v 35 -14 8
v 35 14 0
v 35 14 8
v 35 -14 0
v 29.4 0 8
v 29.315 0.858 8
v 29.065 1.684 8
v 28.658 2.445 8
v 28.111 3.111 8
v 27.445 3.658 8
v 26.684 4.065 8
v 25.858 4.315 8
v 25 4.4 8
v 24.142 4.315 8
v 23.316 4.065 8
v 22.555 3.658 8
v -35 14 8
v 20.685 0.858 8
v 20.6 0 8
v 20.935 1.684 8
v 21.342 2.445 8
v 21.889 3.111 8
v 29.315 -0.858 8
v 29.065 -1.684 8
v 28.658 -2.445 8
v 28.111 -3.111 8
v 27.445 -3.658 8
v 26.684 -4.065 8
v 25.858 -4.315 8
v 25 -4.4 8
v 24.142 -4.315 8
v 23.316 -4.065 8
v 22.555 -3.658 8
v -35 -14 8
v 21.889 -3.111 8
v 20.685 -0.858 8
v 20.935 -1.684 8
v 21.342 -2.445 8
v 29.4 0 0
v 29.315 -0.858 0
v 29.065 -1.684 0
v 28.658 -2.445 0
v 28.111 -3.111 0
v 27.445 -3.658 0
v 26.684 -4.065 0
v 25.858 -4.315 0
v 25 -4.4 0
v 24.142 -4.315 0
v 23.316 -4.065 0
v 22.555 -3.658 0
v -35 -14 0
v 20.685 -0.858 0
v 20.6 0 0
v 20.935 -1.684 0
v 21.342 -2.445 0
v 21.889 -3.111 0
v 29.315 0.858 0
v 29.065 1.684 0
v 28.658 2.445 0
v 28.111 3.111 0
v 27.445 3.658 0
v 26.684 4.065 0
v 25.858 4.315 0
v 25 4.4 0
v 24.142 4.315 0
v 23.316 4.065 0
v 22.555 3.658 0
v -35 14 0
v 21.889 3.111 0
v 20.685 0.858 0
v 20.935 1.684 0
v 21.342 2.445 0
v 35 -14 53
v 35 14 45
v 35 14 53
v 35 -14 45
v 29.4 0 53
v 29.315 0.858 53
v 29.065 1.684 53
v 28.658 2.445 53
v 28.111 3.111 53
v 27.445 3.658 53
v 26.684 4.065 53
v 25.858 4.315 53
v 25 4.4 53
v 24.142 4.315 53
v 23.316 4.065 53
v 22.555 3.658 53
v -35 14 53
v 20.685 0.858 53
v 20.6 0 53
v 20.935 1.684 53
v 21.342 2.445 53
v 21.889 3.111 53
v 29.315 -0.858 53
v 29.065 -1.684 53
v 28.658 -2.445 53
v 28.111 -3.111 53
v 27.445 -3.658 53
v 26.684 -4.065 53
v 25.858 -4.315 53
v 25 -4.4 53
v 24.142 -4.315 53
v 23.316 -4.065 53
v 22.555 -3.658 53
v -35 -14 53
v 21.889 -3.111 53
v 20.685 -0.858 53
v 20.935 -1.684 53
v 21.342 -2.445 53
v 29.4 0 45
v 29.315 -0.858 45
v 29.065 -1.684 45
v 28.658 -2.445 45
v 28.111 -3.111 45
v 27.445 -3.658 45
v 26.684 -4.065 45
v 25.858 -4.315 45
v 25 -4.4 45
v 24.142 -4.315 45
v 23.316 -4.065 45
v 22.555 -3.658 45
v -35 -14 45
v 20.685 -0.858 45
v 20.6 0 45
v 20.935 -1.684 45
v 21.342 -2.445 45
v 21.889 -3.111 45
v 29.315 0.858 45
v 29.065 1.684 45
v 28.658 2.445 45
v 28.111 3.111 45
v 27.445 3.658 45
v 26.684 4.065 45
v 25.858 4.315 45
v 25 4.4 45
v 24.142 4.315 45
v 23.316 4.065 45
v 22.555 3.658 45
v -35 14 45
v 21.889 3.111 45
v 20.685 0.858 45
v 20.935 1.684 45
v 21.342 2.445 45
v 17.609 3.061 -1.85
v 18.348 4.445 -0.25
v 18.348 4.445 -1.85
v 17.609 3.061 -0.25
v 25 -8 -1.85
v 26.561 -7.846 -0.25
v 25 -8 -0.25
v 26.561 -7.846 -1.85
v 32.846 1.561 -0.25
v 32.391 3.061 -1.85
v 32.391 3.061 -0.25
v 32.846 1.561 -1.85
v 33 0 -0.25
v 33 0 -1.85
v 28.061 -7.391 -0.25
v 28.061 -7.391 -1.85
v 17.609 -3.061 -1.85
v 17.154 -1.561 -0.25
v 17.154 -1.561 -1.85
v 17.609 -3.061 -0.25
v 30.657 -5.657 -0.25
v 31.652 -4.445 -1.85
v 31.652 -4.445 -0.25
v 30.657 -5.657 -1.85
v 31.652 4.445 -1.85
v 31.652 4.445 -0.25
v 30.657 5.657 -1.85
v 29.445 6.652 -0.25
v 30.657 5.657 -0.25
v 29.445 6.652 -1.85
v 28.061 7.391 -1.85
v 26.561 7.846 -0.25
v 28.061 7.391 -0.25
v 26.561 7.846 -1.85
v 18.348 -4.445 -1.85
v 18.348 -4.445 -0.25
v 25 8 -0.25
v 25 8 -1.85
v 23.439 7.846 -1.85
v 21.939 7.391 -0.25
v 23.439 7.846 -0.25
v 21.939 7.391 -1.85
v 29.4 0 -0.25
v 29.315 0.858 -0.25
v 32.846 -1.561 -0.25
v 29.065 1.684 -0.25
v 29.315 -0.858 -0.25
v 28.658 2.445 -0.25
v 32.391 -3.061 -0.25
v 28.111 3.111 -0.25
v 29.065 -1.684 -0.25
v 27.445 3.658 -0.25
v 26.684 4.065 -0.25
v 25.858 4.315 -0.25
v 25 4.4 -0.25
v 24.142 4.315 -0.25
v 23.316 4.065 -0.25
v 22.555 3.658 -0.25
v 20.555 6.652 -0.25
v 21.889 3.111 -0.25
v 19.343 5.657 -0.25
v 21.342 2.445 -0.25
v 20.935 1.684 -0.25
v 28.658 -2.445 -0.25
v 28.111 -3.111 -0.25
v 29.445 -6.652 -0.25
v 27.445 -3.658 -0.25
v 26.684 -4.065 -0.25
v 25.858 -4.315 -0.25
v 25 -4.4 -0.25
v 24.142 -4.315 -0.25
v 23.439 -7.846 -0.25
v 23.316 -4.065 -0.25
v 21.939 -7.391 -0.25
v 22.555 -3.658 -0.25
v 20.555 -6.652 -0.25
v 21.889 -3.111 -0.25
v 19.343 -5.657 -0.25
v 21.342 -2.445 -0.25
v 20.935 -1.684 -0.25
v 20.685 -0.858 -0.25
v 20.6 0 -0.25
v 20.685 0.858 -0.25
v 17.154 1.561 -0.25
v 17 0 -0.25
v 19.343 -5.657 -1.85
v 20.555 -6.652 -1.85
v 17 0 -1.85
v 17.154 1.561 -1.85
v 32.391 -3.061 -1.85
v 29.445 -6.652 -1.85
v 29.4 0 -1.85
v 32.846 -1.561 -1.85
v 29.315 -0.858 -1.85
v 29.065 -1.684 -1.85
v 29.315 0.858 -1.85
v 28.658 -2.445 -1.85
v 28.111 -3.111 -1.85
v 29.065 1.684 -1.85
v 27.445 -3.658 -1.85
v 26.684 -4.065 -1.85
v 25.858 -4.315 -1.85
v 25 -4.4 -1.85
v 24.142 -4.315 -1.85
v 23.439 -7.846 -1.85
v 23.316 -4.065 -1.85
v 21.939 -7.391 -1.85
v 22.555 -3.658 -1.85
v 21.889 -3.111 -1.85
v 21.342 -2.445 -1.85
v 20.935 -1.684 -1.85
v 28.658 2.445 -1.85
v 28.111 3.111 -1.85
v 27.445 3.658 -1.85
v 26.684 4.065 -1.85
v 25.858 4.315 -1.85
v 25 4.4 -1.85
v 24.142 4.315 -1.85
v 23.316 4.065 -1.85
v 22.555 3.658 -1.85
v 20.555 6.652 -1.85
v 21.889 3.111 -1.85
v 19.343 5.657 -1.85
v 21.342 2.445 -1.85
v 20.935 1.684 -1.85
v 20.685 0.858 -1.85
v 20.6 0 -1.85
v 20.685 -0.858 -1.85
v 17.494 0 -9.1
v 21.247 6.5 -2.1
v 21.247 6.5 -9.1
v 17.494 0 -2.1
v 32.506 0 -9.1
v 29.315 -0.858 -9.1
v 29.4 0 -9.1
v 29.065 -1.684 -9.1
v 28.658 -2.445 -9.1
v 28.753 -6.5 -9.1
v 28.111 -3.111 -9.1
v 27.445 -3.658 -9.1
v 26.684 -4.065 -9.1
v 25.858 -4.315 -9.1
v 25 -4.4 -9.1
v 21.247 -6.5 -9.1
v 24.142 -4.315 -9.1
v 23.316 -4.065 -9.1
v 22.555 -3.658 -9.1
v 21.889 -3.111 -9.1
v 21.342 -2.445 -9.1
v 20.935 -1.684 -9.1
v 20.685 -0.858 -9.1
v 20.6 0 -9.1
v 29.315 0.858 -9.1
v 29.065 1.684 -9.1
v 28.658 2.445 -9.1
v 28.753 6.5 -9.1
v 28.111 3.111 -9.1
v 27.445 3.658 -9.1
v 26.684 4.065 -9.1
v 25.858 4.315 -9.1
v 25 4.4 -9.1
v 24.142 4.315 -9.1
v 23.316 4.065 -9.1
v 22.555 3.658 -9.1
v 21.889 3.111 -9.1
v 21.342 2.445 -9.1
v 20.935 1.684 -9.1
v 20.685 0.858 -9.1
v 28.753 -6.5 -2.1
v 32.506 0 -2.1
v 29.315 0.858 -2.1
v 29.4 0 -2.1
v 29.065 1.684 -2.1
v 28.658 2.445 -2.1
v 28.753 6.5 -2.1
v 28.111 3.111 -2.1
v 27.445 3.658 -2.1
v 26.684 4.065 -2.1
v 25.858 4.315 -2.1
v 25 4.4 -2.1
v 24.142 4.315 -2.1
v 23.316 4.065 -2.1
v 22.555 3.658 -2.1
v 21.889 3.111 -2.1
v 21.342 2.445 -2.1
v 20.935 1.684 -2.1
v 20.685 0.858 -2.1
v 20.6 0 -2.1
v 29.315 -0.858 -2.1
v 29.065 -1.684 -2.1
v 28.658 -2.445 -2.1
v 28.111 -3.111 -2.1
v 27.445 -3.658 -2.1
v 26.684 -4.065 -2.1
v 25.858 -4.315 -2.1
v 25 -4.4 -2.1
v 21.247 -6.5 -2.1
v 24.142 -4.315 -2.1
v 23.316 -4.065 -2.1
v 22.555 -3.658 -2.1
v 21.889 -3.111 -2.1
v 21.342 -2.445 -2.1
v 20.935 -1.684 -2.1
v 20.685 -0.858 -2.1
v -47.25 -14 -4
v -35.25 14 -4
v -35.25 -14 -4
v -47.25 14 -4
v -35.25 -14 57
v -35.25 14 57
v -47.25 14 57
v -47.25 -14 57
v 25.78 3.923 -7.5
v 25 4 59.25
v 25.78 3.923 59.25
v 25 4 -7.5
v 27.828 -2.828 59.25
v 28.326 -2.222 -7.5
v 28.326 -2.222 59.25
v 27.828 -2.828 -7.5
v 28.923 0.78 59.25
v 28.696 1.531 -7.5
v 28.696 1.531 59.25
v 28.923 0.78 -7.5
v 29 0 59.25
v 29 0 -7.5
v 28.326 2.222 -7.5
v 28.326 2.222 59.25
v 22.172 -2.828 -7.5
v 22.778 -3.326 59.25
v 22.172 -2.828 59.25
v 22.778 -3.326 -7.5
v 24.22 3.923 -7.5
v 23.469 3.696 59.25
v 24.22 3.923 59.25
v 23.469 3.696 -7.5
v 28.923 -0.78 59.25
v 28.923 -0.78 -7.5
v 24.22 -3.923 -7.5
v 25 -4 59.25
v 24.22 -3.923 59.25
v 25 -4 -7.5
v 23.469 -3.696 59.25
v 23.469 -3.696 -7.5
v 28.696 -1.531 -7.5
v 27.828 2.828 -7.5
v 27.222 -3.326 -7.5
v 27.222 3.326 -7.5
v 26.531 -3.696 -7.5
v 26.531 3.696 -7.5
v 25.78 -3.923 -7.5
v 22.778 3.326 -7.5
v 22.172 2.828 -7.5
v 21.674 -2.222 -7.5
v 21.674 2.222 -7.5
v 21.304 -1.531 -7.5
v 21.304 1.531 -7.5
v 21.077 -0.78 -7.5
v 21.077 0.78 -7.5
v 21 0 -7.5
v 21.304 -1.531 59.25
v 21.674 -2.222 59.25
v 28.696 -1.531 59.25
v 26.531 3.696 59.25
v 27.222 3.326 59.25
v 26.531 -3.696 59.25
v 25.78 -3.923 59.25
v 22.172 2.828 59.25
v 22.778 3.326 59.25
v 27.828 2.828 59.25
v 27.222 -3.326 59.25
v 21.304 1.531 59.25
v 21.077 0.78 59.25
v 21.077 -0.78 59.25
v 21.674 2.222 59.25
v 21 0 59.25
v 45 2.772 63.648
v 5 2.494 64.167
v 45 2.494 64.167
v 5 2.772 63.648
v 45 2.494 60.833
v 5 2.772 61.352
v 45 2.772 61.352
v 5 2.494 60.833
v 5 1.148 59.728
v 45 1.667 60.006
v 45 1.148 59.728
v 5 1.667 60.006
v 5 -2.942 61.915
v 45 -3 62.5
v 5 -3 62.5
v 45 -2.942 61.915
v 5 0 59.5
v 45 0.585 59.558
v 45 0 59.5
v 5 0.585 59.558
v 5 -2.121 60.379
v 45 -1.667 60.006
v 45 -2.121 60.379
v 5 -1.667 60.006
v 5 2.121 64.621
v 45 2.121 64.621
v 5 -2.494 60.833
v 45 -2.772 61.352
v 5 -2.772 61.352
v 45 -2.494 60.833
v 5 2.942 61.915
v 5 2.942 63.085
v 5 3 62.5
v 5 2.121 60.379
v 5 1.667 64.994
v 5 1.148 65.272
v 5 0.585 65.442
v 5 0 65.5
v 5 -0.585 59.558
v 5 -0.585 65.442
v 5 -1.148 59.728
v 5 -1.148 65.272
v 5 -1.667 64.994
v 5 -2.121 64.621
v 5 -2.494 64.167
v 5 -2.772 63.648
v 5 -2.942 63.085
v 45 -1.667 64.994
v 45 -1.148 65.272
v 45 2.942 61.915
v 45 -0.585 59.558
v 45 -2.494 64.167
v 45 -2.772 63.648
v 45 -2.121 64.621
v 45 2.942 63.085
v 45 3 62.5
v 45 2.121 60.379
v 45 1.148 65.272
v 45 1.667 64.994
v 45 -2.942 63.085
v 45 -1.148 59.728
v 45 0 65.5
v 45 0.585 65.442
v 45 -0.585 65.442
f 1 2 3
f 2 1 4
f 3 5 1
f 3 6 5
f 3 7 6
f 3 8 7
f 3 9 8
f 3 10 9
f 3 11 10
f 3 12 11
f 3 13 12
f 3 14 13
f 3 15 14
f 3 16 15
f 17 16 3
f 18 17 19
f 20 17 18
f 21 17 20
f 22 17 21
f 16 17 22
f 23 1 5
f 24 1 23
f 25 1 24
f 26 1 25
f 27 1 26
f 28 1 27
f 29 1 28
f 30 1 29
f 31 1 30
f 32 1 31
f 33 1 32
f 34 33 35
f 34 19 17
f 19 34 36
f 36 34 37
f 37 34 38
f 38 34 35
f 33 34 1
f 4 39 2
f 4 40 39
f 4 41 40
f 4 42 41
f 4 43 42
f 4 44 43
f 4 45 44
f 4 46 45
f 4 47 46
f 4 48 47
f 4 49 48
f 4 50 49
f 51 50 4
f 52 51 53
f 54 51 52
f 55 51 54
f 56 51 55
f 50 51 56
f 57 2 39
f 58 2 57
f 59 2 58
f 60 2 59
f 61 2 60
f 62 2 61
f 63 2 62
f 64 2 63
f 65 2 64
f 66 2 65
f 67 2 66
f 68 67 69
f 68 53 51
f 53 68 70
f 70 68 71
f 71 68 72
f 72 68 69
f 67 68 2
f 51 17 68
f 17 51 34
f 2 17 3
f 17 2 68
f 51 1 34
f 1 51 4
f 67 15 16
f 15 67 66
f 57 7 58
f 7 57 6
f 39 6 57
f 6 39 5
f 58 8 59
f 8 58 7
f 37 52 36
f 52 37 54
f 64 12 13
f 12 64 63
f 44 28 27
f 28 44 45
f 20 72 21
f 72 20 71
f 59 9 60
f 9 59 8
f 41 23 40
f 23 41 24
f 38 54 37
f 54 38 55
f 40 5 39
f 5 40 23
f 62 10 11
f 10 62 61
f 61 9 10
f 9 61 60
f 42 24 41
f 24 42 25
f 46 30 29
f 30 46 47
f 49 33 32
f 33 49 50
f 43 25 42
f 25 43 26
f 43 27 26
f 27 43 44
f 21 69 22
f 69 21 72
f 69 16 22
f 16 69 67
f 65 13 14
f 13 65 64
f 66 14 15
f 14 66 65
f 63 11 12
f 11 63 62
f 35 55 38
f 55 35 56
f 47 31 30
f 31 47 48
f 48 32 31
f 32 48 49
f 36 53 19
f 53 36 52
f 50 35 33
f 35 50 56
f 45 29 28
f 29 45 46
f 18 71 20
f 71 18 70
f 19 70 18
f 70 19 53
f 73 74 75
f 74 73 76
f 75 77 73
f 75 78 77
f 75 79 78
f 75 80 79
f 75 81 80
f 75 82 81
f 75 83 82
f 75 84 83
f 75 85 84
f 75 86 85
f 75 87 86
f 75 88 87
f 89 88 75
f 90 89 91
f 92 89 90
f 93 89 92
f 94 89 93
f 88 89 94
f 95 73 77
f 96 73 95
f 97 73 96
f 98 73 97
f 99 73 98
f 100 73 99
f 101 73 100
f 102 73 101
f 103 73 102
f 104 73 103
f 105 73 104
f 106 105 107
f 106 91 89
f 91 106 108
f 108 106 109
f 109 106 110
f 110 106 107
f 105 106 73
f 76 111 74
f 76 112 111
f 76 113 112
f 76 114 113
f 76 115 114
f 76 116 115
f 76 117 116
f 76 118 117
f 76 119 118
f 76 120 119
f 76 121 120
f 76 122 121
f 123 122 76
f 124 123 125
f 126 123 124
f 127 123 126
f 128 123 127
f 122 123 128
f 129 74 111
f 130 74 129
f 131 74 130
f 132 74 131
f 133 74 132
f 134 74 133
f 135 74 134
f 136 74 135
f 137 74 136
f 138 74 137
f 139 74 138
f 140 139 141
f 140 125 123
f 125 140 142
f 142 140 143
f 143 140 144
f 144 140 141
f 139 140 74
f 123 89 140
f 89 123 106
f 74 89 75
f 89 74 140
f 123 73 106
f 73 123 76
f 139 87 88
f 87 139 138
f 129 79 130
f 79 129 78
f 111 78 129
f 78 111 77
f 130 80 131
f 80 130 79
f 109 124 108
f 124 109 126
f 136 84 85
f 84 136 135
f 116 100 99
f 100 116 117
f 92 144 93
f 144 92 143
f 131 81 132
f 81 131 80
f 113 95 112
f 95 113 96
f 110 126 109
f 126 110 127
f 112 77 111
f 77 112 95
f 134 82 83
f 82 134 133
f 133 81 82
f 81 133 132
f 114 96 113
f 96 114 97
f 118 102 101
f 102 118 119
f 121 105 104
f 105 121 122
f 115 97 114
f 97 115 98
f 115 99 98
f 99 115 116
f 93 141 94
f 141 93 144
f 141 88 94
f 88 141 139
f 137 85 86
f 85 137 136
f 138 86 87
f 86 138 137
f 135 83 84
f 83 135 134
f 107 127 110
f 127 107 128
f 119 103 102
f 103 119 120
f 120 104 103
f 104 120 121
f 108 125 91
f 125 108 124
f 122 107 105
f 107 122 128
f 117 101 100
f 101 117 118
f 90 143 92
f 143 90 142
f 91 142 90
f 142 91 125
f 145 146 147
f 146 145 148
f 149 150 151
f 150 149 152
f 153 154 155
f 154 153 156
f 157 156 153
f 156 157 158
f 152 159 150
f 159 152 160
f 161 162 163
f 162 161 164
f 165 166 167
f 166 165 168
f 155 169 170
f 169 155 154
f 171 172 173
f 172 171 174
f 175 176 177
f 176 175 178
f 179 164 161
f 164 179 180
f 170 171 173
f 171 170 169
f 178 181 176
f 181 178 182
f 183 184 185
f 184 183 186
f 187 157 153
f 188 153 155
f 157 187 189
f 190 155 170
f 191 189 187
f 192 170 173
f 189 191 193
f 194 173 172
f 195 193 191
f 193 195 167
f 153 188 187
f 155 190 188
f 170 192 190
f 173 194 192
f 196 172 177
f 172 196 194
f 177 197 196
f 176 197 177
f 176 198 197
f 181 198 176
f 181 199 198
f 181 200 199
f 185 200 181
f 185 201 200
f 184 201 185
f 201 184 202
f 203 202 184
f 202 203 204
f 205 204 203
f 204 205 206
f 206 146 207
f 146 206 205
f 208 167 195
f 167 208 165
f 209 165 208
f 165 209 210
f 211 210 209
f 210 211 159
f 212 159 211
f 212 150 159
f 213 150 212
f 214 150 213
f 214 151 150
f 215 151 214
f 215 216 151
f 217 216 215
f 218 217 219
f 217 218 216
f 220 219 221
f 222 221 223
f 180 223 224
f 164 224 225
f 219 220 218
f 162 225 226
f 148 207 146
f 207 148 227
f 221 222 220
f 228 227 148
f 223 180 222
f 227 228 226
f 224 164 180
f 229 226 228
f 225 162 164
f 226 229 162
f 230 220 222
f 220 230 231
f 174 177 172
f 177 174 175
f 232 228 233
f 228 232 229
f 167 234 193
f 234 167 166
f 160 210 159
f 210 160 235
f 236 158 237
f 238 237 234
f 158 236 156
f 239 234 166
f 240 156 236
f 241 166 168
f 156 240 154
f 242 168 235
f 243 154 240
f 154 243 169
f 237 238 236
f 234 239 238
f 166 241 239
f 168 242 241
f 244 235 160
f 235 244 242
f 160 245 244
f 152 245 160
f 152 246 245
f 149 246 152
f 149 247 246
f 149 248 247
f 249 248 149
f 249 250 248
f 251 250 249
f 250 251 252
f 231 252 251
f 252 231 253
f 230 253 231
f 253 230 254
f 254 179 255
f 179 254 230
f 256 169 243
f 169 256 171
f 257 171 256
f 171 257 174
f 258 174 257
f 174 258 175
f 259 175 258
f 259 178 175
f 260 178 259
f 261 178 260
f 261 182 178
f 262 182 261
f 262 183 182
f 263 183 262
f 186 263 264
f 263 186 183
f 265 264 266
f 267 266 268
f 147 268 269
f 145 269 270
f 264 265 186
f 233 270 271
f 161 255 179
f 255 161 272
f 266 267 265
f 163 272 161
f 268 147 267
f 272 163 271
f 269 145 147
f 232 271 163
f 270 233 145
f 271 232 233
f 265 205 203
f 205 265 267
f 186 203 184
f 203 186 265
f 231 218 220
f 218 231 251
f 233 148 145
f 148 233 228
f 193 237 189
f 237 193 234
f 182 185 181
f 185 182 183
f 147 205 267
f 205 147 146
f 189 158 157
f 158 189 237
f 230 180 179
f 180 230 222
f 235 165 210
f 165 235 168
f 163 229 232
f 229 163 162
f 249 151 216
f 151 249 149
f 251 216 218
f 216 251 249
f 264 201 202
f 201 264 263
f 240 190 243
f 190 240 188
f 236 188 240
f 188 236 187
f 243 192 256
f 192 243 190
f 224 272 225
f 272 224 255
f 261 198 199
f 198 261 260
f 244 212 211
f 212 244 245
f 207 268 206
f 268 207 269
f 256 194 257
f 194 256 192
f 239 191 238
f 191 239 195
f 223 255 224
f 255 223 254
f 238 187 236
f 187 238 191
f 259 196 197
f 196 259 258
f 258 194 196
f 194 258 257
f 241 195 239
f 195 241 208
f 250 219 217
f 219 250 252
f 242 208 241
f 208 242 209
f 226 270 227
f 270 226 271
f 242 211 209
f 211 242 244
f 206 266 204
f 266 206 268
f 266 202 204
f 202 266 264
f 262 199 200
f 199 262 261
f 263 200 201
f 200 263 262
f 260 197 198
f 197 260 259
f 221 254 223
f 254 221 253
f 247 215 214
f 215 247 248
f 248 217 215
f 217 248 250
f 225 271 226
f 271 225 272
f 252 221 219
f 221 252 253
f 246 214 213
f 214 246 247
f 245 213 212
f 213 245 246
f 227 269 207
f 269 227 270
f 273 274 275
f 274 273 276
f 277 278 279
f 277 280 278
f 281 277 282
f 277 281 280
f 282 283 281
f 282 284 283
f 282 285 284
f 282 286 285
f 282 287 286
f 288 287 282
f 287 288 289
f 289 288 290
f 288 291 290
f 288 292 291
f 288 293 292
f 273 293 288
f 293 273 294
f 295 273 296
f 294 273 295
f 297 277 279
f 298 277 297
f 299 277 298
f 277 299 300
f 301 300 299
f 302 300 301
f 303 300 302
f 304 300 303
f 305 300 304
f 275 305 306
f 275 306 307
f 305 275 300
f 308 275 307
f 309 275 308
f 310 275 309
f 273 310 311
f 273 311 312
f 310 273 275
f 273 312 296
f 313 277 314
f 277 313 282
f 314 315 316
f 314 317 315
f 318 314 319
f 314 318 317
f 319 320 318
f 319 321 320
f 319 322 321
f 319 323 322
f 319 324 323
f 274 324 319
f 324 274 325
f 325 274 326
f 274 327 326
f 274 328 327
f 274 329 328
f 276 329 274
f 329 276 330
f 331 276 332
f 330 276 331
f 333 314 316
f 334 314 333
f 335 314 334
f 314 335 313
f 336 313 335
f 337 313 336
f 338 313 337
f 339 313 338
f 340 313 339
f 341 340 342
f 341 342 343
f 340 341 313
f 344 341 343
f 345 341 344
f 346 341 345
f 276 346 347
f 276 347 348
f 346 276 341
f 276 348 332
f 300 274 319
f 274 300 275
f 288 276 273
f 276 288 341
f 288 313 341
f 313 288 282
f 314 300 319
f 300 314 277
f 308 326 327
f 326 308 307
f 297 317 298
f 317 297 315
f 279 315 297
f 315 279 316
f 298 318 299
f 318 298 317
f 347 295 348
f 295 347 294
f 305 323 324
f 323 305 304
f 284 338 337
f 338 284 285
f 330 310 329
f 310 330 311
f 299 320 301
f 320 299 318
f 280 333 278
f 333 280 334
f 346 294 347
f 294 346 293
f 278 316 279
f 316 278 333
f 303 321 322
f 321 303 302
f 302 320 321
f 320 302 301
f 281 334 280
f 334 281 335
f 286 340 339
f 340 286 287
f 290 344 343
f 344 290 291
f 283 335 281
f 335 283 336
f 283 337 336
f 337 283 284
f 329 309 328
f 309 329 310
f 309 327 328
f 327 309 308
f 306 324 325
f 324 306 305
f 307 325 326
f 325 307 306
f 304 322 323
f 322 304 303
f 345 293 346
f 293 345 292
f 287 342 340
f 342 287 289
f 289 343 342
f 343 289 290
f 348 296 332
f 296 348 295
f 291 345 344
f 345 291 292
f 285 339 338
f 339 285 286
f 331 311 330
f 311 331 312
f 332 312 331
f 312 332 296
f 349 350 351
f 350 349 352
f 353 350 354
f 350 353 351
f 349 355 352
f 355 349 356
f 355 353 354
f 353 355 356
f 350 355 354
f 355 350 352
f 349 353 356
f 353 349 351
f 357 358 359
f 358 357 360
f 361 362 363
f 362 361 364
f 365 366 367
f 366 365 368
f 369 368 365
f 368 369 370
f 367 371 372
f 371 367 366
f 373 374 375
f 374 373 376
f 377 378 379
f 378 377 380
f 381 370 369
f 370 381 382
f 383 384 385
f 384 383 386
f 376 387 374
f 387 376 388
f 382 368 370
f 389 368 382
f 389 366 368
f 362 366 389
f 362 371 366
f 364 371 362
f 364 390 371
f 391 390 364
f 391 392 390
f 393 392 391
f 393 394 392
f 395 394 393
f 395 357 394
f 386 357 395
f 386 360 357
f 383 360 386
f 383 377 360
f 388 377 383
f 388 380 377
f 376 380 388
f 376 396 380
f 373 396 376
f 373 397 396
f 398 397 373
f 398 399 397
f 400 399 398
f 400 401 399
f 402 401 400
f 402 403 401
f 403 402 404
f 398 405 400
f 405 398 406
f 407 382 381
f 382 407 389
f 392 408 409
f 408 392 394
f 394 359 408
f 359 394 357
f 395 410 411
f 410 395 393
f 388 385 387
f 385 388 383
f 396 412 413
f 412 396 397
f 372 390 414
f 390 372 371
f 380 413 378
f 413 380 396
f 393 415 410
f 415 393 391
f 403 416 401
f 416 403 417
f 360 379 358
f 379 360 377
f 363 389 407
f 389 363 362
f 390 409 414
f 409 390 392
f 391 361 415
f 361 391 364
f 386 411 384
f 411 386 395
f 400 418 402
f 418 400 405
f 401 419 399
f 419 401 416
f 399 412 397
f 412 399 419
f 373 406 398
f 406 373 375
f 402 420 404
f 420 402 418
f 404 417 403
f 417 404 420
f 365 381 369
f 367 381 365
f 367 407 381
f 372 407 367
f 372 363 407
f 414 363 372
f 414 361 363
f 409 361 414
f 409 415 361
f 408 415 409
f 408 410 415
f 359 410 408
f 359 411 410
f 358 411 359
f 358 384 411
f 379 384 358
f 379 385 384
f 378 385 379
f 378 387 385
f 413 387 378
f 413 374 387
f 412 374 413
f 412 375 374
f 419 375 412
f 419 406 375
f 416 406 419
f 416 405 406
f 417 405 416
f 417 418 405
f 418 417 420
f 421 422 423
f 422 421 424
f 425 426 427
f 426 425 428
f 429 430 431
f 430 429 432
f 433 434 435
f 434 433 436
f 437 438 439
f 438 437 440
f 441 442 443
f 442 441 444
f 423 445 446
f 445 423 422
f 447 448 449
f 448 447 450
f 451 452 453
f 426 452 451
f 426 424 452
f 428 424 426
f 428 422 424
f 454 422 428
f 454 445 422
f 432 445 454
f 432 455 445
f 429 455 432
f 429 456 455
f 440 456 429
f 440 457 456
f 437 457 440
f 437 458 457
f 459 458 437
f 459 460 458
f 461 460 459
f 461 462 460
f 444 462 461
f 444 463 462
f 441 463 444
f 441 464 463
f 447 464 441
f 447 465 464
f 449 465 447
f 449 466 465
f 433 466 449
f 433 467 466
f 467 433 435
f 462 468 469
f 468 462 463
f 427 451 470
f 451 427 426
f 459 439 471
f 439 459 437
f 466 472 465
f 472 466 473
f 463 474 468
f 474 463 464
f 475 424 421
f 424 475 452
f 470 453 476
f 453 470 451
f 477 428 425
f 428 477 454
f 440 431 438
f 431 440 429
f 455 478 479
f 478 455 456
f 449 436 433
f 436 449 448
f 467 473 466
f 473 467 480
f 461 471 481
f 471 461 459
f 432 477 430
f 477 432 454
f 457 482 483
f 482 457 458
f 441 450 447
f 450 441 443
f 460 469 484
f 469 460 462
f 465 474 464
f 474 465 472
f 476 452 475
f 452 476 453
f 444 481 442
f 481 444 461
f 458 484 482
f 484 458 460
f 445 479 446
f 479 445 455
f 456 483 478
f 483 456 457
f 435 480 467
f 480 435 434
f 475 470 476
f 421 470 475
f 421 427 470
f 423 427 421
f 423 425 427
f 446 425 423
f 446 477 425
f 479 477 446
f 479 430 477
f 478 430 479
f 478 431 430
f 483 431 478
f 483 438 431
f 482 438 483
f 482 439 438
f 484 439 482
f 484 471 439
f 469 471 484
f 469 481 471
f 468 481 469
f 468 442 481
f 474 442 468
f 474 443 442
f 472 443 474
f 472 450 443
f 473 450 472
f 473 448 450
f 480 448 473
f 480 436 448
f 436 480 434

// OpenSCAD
$fn = 32;

// ------------------------------------------------------------------------
// C clamp: throat 45 mm, screw d8
// Every part is its own module, assembly() places every instance.
// ------------------------------------------------------------------------

// --- part 1 ---
module clamp_arm() {
  difference() {
    translate([-35, -14, 0]) cube([70, 28, 8]);
    translate([25, 0, -1]) cylinder(h = 10, d = 8.8);
  }
}

// --- part 2 ---
module clamp_spine() {
  difference() {
    translate([-30.5, -14, 0]) cube([61, 28, 12]);
  }
}

// --- part 3 ---
module clamp_screw() {
  translate([0, 0, -33.375]) cylinder(h = 66.75, d = 8);
}

// --- part 4 ---
module clamp_washer() {
  difference() {
      translate([0, 0, 0]) cylinder(h = 1.6, d = 16);
      translate([0, 0, -1]) cylinder(h = 3.6, d = 8.8);
    }
}

// --- part 5 ---
module clamp_nut() {
  difference() {
    linear_extrude(height = 7) polygon(points = [[7.506, 0], [3.753, 6.5], [-3.753, 6.5], [-7.506, 0], [-3.753, -6.5], [3.753, -6.5]]);
    translate([0, 0, -1]) cylinder(h = 9, d = 8.8);
  }
}

// --- part 6 ---
module tommy_bar() {
  translate([0, 0, -20]) cylinder(h = 40, d = 6);
}

// --- assembly ---
module assembly() {
  color([0.80, 0.24, 0.20]) translate([0, 0, 0]) rotate([0, 0, 0]) clamp_arm();
  color([0.20, 0.45, 0.75]) translate([0, 0, 45]) rotate([0, 0, 0]) clamp_arm();
  color([0.25, 0.62, 0.32]) translate([-47.25, 0, 26.5]) rotate([0, 90, 0]) clamp_spine();
  color([0.92, 0.70, 0.18]) translate([25, 0, 25.875]) rotate([0, 0, 0]) clamp_screw();
  color([0.58, 0.35, 0.70]) translate([25, 0, -1.85]) rotate([0, 0, 0]) clamp_washer();
  color([0.16, 0.66, 0.66]) translate([25, 0, -9.1]) rotate([0, 0, 0]) clamp_nut();
  color([0.85, 0.48, 0.18]) translate([25, 0, 62.5]) rotate([0, 90, 0]) tommy_bar();
}

assembly();
